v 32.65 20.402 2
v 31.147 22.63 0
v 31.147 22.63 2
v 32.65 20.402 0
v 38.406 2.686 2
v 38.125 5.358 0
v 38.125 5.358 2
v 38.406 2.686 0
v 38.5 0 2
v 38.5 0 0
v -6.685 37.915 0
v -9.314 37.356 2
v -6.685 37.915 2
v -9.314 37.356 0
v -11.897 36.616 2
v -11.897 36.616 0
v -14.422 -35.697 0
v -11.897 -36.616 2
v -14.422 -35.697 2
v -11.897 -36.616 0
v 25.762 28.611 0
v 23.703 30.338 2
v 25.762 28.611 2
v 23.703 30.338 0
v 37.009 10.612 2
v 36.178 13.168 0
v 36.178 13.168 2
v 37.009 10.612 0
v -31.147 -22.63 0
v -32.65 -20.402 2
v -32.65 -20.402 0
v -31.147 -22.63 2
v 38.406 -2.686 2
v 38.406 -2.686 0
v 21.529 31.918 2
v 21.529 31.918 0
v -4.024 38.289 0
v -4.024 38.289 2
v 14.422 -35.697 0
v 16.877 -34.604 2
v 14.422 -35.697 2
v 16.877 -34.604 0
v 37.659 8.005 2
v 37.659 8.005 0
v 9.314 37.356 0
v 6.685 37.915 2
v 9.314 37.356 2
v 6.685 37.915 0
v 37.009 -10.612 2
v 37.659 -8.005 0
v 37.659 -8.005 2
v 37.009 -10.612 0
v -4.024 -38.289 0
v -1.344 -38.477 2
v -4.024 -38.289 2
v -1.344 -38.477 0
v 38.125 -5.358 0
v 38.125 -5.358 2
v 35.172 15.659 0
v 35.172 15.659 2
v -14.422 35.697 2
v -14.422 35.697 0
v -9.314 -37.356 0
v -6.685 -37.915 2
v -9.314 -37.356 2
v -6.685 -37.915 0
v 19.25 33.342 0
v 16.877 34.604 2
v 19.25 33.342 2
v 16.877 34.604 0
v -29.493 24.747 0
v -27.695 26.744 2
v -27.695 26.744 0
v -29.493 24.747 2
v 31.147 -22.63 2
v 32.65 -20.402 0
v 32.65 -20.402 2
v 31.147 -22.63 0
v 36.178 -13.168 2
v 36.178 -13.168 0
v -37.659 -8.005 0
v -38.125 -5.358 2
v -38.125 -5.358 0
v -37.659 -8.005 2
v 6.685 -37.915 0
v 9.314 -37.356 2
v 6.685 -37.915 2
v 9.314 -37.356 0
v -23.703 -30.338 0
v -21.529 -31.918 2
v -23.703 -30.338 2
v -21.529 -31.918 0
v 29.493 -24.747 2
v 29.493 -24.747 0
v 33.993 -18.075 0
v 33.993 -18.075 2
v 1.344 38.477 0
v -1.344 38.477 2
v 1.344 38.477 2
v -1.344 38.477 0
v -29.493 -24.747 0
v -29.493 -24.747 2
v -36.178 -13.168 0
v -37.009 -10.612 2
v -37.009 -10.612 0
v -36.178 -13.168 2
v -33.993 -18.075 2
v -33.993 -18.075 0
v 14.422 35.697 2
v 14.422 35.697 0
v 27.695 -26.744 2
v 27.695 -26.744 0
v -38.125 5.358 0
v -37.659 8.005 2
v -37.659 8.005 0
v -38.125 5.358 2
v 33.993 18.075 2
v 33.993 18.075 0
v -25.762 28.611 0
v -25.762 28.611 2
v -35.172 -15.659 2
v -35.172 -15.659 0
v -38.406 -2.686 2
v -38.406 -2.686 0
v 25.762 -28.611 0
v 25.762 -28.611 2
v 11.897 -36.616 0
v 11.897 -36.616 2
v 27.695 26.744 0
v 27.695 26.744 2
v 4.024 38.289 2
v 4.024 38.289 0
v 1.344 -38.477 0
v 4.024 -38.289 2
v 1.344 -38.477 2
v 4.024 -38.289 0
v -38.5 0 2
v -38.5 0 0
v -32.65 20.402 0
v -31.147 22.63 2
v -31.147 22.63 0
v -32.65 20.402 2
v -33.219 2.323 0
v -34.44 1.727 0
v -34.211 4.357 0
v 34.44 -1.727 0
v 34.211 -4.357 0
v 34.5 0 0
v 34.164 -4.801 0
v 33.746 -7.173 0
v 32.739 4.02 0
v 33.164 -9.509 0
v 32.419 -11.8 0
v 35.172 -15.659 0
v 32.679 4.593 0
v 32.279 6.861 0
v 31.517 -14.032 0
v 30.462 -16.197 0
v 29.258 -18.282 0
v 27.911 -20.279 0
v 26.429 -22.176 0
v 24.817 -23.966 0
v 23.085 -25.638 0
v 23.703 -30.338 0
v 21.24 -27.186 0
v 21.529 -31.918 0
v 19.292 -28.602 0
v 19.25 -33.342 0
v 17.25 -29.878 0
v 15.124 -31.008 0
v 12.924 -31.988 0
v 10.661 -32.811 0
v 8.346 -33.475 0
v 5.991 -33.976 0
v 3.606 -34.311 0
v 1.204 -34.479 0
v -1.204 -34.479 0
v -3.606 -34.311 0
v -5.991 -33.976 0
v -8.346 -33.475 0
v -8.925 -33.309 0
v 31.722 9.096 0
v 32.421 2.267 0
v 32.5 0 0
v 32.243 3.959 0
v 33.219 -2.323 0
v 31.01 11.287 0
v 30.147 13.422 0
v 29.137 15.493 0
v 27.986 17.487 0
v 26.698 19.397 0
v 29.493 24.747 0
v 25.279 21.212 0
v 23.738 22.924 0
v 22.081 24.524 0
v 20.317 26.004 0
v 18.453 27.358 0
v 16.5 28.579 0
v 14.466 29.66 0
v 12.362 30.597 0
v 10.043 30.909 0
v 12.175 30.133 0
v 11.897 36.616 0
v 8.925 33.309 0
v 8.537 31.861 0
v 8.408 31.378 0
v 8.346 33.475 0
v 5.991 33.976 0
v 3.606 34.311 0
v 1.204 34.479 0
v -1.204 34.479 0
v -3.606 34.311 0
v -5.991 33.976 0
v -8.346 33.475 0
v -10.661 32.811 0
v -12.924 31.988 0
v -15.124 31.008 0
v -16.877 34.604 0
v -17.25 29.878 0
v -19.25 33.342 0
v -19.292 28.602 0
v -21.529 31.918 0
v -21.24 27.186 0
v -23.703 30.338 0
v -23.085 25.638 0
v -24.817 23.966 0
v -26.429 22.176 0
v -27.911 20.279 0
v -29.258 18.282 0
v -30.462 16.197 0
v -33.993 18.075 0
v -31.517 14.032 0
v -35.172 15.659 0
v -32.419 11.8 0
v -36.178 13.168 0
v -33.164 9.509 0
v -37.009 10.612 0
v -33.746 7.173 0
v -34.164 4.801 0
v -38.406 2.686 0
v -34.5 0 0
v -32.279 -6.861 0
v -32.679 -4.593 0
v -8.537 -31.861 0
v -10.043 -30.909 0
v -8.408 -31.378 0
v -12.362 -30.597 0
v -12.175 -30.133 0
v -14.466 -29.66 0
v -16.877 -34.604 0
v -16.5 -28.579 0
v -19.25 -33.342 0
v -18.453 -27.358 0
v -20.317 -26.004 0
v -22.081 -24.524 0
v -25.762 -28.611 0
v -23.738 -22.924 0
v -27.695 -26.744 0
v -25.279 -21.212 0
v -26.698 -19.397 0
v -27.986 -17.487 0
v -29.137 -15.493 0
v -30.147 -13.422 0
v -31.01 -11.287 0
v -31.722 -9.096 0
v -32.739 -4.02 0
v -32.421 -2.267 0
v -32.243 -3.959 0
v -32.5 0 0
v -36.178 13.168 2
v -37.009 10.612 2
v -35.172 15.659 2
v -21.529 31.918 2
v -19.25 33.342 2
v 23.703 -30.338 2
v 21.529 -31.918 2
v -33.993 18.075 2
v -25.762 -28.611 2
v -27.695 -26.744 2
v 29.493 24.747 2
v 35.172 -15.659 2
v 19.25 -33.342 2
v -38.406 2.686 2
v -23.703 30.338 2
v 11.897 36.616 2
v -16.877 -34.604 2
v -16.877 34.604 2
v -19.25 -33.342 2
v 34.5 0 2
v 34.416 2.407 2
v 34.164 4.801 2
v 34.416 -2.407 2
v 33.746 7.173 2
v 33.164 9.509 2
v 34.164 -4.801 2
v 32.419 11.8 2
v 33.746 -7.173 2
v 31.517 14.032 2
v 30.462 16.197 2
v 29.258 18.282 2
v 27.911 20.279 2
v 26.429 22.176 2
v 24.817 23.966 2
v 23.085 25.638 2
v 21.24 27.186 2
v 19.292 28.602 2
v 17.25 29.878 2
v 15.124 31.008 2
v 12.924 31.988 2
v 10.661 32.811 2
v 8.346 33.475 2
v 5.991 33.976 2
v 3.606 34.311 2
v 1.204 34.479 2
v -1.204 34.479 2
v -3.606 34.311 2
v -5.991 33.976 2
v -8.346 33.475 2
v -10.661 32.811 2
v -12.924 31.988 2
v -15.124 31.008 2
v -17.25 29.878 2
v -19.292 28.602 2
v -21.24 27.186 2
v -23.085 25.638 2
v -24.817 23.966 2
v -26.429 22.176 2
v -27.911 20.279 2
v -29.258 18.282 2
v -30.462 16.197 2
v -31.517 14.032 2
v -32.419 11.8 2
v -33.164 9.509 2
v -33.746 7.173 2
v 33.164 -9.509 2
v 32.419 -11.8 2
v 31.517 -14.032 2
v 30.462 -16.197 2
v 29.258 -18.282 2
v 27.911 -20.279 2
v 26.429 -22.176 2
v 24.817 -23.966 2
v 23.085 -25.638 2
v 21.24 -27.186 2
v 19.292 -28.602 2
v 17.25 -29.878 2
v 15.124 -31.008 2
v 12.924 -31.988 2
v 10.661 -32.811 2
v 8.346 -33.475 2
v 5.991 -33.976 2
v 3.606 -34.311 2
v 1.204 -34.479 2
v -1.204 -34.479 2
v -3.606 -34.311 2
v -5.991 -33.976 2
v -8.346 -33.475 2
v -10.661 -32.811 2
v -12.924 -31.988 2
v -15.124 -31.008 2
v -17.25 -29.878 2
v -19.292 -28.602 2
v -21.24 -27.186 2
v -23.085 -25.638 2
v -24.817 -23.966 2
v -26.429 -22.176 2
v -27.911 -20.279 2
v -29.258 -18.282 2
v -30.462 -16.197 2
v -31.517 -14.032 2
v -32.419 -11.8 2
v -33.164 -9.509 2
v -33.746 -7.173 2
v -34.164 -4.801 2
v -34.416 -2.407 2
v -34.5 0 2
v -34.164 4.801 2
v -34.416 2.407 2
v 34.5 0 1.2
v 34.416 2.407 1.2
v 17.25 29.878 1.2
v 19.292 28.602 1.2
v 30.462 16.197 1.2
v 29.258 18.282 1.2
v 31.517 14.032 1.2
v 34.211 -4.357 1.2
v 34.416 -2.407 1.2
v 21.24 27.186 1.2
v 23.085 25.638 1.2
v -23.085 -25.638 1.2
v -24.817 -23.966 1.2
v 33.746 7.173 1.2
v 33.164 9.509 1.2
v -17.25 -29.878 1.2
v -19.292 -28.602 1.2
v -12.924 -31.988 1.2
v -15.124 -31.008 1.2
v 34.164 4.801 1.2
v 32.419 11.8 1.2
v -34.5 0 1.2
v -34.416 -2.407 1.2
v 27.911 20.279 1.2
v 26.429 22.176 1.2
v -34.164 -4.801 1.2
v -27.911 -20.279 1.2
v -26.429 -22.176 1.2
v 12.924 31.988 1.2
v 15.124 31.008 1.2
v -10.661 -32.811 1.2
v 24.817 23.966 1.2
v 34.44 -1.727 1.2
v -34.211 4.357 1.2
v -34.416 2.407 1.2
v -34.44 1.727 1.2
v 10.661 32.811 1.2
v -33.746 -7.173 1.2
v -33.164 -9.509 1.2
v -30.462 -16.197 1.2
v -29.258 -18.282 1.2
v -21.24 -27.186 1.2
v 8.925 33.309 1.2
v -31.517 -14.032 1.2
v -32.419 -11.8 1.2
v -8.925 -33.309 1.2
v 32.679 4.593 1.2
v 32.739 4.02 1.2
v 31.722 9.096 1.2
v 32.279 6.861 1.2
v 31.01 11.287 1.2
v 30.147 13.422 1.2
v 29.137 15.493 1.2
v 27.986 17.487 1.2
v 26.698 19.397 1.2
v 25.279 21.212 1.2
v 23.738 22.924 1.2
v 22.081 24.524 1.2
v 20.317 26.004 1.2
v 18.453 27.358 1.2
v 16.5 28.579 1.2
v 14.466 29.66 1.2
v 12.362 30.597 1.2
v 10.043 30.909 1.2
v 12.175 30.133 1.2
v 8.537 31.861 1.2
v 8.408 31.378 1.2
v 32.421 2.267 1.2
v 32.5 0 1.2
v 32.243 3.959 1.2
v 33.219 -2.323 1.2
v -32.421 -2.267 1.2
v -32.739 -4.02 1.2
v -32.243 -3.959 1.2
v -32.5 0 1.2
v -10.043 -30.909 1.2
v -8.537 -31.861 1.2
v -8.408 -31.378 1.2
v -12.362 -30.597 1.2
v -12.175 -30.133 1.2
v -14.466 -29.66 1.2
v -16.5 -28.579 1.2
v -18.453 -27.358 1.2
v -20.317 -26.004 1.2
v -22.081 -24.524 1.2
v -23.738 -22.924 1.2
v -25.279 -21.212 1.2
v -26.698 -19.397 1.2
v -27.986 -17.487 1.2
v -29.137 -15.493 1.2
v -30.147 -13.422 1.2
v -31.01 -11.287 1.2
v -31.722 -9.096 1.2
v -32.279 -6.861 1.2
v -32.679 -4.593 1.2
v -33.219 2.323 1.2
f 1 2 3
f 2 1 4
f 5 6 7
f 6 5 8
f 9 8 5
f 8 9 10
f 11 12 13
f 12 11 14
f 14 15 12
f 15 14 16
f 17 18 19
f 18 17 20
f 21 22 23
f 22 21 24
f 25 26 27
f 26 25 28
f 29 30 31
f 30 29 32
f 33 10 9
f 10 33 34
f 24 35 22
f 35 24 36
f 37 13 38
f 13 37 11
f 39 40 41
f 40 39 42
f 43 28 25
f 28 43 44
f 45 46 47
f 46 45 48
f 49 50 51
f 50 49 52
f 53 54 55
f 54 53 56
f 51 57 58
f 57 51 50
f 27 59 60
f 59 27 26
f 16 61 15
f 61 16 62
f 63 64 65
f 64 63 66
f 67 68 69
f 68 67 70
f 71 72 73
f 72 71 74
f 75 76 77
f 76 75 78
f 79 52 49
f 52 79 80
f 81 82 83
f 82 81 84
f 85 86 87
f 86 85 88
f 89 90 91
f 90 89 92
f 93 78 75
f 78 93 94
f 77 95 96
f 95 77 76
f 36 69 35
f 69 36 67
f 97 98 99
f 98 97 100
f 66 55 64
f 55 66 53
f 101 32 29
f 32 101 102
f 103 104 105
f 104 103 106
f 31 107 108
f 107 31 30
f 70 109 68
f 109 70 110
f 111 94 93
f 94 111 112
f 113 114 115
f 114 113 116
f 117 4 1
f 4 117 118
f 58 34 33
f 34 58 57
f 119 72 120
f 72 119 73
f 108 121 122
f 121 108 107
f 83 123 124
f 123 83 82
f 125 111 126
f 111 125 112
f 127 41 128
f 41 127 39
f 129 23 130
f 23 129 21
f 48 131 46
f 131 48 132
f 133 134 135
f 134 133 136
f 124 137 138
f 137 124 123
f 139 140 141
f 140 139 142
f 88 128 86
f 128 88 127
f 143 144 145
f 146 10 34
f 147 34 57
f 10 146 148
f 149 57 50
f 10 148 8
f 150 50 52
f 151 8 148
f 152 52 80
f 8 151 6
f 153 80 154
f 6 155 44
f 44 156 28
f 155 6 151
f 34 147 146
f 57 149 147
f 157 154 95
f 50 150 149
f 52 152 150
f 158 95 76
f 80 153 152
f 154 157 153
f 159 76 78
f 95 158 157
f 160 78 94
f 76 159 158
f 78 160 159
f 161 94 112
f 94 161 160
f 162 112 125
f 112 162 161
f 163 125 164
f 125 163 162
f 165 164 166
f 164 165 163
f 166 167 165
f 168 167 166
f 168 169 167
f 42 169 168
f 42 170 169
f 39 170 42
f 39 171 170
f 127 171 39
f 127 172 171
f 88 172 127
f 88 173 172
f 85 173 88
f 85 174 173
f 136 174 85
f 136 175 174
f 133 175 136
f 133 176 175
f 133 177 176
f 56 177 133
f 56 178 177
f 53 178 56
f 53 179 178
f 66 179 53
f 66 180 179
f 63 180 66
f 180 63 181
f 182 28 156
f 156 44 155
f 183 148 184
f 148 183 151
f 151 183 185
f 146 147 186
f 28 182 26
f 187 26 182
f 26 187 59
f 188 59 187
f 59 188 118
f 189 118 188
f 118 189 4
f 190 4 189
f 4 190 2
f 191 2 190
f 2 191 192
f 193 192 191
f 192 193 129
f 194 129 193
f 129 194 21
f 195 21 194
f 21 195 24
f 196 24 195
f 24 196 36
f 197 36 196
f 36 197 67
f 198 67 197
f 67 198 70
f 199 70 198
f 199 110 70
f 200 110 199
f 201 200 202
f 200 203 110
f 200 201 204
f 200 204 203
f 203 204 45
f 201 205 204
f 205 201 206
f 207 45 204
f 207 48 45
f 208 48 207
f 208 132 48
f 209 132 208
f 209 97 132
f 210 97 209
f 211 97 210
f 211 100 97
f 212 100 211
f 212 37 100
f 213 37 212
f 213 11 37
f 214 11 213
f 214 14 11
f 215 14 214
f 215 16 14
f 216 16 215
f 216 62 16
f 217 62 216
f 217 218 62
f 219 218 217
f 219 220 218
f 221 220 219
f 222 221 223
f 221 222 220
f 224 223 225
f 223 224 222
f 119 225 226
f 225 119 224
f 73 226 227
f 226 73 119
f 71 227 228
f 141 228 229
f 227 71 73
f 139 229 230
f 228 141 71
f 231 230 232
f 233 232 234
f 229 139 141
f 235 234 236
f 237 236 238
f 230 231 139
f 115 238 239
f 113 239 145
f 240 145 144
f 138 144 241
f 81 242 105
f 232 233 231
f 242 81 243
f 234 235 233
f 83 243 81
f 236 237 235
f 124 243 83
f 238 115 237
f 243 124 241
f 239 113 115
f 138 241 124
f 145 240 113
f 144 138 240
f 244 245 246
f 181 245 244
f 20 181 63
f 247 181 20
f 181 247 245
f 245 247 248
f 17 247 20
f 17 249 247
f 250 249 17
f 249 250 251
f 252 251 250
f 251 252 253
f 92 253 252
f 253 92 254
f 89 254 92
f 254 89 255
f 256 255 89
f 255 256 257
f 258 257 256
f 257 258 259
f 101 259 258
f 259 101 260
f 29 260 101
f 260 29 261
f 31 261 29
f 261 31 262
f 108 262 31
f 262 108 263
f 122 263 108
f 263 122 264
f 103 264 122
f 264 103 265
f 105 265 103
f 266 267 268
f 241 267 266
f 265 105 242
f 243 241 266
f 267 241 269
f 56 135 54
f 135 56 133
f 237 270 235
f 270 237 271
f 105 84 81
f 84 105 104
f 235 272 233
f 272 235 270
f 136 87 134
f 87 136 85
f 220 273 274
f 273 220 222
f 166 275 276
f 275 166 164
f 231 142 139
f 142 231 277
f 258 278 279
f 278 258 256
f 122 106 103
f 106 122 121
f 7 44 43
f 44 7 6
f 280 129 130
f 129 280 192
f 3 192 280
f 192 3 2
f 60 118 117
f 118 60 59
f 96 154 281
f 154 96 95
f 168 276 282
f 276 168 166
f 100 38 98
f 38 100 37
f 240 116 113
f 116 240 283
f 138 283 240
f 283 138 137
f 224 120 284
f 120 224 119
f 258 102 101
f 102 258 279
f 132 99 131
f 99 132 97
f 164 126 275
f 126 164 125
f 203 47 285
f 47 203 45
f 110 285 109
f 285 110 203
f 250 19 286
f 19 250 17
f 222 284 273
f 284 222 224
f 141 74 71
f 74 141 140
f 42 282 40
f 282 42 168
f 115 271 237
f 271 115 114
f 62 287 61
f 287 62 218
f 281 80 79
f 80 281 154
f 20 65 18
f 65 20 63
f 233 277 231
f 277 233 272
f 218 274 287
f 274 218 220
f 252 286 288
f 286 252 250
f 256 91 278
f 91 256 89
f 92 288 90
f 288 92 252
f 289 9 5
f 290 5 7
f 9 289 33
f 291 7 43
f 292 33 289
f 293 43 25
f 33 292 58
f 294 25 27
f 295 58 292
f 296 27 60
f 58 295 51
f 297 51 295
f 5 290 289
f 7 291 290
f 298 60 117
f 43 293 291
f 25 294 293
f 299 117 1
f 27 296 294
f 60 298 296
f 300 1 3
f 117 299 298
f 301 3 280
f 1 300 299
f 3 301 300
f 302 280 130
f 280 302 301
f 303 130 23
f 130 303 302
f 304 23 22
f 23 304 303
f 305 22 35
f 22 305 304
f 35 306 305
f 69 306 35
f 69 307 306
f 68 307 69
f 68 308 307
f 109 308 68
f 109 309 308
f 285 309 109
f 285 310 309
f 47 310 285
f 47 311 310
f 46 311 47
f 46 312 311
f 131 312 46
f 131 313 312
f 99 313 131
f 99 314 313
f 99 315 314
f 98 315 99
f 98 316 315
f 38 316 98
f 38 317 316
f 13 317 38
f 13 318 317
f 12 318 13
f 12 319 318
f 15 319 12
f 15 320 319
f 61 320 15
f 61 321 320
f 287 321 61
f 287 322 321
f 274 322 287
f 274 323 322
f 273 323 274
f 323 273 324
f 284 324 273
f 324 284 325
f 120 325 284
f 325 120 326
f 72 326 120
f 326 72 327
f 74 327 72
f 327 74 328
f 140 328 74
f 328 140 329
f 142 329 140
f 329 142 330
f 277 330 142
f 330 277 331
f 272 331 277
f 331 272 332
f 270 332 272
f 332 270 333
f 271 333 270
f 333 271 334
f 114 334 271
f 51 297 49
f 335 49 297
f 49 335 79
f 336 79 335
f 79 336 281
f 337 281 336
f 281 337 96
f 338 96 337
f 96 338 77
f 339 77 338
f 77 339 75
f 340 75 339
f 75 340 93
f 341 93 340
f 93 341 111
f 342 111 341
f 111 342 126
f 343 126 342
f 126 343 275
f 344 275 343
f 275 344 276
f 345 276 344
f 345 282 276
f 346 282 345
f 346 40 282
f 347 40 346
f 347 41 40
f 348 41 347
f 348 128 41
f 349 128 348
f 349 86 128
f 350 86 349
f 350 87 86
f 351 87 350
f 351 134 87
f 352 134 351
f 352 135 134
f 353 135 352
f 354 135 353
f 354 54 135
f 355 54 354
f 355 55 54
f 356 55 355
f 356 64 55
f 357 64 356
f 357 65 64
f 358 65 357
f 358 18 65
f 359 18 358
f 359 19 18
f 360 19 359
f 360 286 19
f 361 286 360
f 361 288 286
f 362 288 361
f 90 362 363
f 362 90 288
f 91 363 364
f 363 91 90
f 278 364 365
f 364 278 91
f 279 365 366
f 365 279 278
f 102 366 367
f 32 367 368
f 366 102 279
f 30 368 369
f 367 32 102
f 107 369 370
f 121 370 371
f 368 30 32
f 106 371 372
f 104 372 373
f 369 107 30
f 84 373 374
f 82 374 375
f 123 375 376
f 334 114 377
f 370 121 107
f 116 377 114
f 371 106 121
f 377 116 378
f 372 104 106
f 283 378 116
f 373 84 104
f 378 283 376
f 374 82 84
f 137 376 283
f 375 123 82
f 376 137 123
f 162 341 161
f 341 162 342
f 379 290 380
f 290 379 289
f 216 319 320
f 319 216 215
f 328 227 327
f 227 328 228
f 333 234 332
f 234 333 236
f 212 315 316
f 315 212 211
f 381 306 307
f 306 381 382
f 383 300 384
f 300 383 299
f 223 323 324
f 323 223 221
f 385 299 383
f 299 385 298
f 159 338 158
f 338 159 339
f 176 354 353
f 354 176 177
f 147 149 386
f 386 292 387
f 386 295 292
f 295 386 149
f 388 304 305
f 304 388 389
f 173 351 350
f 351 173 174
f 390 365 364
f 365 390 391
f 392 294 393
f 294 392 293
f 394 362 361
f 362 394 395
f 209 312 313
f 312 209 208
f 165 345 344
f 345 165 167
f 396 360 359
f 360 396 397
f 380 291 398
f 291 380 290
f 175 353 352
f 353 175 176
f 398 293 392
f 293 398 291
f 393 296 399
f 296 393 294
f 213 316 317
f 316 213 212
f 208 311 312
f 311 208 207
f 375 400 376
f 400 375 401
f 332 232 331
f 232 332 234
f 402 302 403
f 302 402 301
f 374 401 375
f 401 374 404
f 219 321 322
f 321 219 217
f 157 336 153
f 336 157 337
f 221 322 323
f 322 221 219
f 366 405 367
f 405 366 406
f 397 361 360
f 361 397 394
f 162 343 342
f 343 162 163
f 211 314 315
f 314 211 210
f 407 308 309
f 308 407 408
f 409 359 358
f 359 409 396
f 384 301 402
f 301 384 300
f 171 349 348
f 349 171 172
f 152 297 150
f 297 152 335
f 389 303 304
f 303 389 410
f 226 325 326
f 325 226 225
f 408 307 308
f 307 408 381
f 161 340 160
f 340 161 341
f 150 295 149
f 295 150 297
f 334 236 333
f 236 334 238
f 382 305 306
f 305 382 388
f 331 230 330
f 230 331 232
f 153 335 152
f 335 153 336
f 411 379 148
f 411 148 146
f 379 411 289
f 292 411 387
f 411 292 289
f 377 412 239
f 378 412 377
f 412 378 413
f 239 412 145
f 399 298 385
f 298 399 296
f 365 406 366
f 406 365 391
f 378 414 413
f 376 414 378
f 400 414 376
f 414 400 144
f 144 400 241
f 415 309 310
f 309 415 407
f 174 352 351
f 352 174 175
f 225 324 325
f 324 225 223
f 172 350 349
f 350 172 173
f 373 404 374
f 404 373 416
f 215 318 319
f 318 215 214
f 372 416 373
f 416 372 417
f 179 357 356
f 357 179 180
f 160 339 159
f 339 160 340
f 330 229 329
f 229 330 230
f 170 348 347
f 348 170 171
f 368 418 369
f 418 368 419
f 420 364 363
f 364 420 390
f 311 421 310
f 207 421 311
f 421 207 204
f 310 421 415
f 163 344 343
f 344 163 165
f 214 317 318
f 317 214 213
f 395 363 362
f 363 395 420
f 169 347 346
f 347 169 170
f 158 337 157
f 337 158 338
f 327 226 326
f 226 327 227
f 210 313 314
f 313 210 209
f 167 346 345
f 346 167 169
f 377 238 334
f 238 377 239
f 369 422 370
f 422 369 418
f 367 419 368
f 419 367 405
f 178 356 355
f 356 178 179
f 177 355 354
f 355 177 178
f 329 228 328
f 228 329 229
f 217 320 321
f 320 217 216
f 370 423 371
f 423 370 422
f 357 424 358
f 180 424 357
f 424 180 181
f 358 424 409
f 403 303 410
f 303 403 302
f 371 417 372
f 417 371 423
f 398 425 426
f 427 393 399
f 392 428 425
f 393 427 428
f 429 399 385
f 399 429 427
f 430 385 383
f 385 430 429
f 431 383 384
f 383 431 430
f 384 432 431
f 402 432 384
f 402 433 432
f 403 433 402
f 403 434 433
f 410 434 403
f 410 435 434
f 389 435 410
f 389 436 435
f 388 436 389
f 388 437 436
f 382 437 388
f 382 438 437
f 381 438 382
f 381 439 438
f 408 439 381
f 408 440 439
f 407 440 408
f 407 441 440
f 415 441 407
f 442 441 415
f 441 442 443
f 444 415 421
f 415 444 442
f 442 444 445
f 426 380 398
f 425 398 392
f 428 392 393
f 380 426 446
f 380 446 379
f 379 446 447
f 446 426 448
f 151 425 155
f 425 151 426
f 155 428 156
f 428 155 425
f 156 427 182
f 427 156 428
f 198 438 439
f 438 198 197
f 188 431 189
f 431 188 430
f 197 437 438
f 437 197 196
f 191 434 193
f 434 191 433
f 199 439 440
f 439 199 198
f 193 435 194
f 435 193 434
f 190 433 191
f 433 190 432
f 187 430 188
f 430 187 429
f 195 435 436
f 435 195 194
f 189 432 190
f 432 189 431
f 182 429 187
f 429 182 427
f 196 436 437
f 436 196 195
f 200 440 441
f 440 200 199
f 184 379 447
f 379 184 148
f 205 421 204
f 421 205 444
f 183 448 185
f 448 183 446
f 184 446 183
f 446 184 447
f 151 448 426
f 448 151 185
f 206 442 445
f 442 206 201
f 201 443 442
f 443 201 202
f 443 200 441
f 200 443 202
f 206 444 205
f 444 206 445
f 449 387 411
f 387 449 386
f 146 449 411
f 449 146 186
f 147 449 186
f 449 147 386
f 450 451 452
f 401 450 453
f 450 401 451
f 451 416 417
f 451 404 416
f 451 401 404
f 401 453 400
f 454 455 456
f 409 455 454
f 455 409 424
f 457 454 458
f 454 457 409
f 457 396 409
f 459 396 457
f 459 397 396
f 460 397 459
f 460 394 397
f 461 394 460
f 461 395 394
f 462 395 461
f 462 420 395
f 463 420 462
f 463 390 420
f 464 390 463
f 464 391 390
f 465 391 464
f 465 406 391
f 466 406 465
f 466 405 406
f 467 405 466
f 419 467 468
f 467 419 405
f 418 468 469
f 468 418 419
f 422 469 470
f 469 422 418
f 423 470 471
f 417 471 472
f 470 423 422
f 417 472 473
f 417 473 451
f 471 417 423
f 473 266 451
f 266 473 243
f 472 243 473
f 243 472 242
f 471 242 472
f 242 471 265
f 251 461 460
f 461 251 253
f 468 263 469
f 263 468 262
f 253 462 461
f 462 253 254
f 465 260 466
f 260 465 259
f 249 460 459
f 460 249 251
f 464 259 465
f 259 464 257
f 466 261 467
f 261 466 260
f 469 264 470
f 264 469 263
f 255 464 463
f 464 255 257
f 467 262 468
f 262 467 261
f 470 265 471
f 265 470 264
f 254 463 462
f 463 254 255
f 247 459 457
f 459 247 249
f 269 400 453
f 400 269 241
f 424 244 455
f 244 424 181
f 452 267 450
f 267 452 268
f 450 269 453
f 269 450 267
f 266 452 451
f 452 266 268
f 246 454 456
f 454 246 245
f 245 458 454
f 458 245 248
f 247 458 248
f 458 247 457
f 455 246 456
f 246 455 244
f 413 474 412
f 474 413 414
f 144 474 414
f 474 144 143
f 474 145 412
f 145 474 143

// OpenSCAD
// file: my_lib.scad
tolerance = 0.15; 

module bigger(t = tolerance) {
    if (t > 0) {
        minkowski() {
            child(0);
            cube(t, true);
        }
    } else {
        child(0);
    }
}

rounding = 1;
module round(r = rounding) {
	minkowski() {
		child(0);
		sphere(r);
	}
}

module tube(outer_radius, inner_radius, height) {
    difference() {
        cylinder(h = height, r = outer_radius);
        translate([ 0, 0, -1]) cylinder(h = height + 2, r = inner_radius);
    }
}

module pie_slice(outer_radius, inner_radius, angle, height) {
    o1 = outer_radius + 1;
    blocking_half = [2* o1, o1, height + 1];
	blocking_quarter = [o1, o1, height + 1];
	if (angle <= 0) {
		//nothing
	} else if (angle <= 90) {
		difference() {
			tube(outer_radius, inner_radius, height);
			translate([-o1, -o1, -0.5]) cube(blocking_half);
			translate([-o1, -0.5, -0.5]) cube(blocking_quarter);
			rotate([0,0,angle]) translate([0, 0, -0.5]) cube(blocking_quarter);
		}
	} else if (angle <= 180) {
		difference() {
			tube(outer_radius, inner_radius, height);
			translate([-o1, -o1, -0.5]) cube(blocking_half);
			rotate([0,0,angle]) translate([0, 0, -0.5]) cube(blocking_quarter);
		}
	} else if (angle <= 270) {
		difference() {
			tube(outer_radius, inner_radius, height);
			translate([0, -o1, -0.5]) cube(blocking_quarter);
			rotate([0,0,angle]) translate([0, 0, -0.5]) cube(blocking_quarter);
		}
	} else if (angle <= 360) {
		difference() {
			tube(outer_radius, inner_radius, height);
			intersection() {
				translate([0, -o1, -0.5]) cube(blocking_quarter);
				rotate([0,0,angle]) translate([0, 0, -0.5]) cube(blocking_quarter);
			}
		}
	} else {
		tube(outer_radius, inner_radius, height);
	}
}

module torus (r1 = 2, r2 = 1, a = 360) {
	intersection() {
		rotate_extrude(convexity = 10, $fn = 50)
			translate([r1, 0, 0])
				circle(r = r2, $fn = 20);
		translate([0, 0, -r2 -0.5])
			pie_slice(r1 + r2 + 1, r1 - r2 - 1, a, 2*r2 + 1);
	}
}

module trapeze(h, w, r1, r2, center = false) {
    rotate([-90,0,0]) linear_extrude(height = w) projection(false) rotate([90,0,0]) cylinder(h, r1/2, r2/2, center);
}
// main file
$fa=4;
$fs=0.5;

include <my_lib.scad>

//adapter that can mimic an hb-42 lens hood

outer = 69/2;
inner = 66/2;
bump = 0.5;

union(){
	tube(outer+4,outer,2);
	for (i = [0, 1]) {
		rotate([0,0,180*i]){
			pie_slice(outer + 0.1,inner,75,1.2);
			pie_slice(outer + 0.1,inner-bump,7,1.2);
			rotate([0,0,68]) pie_slice(outer + 0.1,inner-bump,7,1.2);
			rotate([0,0,-4])
				translate([inner+0.3,0,0])
					rotate([0,0,-60])
						cube([4,3,1.2]);
		}
	}
}
